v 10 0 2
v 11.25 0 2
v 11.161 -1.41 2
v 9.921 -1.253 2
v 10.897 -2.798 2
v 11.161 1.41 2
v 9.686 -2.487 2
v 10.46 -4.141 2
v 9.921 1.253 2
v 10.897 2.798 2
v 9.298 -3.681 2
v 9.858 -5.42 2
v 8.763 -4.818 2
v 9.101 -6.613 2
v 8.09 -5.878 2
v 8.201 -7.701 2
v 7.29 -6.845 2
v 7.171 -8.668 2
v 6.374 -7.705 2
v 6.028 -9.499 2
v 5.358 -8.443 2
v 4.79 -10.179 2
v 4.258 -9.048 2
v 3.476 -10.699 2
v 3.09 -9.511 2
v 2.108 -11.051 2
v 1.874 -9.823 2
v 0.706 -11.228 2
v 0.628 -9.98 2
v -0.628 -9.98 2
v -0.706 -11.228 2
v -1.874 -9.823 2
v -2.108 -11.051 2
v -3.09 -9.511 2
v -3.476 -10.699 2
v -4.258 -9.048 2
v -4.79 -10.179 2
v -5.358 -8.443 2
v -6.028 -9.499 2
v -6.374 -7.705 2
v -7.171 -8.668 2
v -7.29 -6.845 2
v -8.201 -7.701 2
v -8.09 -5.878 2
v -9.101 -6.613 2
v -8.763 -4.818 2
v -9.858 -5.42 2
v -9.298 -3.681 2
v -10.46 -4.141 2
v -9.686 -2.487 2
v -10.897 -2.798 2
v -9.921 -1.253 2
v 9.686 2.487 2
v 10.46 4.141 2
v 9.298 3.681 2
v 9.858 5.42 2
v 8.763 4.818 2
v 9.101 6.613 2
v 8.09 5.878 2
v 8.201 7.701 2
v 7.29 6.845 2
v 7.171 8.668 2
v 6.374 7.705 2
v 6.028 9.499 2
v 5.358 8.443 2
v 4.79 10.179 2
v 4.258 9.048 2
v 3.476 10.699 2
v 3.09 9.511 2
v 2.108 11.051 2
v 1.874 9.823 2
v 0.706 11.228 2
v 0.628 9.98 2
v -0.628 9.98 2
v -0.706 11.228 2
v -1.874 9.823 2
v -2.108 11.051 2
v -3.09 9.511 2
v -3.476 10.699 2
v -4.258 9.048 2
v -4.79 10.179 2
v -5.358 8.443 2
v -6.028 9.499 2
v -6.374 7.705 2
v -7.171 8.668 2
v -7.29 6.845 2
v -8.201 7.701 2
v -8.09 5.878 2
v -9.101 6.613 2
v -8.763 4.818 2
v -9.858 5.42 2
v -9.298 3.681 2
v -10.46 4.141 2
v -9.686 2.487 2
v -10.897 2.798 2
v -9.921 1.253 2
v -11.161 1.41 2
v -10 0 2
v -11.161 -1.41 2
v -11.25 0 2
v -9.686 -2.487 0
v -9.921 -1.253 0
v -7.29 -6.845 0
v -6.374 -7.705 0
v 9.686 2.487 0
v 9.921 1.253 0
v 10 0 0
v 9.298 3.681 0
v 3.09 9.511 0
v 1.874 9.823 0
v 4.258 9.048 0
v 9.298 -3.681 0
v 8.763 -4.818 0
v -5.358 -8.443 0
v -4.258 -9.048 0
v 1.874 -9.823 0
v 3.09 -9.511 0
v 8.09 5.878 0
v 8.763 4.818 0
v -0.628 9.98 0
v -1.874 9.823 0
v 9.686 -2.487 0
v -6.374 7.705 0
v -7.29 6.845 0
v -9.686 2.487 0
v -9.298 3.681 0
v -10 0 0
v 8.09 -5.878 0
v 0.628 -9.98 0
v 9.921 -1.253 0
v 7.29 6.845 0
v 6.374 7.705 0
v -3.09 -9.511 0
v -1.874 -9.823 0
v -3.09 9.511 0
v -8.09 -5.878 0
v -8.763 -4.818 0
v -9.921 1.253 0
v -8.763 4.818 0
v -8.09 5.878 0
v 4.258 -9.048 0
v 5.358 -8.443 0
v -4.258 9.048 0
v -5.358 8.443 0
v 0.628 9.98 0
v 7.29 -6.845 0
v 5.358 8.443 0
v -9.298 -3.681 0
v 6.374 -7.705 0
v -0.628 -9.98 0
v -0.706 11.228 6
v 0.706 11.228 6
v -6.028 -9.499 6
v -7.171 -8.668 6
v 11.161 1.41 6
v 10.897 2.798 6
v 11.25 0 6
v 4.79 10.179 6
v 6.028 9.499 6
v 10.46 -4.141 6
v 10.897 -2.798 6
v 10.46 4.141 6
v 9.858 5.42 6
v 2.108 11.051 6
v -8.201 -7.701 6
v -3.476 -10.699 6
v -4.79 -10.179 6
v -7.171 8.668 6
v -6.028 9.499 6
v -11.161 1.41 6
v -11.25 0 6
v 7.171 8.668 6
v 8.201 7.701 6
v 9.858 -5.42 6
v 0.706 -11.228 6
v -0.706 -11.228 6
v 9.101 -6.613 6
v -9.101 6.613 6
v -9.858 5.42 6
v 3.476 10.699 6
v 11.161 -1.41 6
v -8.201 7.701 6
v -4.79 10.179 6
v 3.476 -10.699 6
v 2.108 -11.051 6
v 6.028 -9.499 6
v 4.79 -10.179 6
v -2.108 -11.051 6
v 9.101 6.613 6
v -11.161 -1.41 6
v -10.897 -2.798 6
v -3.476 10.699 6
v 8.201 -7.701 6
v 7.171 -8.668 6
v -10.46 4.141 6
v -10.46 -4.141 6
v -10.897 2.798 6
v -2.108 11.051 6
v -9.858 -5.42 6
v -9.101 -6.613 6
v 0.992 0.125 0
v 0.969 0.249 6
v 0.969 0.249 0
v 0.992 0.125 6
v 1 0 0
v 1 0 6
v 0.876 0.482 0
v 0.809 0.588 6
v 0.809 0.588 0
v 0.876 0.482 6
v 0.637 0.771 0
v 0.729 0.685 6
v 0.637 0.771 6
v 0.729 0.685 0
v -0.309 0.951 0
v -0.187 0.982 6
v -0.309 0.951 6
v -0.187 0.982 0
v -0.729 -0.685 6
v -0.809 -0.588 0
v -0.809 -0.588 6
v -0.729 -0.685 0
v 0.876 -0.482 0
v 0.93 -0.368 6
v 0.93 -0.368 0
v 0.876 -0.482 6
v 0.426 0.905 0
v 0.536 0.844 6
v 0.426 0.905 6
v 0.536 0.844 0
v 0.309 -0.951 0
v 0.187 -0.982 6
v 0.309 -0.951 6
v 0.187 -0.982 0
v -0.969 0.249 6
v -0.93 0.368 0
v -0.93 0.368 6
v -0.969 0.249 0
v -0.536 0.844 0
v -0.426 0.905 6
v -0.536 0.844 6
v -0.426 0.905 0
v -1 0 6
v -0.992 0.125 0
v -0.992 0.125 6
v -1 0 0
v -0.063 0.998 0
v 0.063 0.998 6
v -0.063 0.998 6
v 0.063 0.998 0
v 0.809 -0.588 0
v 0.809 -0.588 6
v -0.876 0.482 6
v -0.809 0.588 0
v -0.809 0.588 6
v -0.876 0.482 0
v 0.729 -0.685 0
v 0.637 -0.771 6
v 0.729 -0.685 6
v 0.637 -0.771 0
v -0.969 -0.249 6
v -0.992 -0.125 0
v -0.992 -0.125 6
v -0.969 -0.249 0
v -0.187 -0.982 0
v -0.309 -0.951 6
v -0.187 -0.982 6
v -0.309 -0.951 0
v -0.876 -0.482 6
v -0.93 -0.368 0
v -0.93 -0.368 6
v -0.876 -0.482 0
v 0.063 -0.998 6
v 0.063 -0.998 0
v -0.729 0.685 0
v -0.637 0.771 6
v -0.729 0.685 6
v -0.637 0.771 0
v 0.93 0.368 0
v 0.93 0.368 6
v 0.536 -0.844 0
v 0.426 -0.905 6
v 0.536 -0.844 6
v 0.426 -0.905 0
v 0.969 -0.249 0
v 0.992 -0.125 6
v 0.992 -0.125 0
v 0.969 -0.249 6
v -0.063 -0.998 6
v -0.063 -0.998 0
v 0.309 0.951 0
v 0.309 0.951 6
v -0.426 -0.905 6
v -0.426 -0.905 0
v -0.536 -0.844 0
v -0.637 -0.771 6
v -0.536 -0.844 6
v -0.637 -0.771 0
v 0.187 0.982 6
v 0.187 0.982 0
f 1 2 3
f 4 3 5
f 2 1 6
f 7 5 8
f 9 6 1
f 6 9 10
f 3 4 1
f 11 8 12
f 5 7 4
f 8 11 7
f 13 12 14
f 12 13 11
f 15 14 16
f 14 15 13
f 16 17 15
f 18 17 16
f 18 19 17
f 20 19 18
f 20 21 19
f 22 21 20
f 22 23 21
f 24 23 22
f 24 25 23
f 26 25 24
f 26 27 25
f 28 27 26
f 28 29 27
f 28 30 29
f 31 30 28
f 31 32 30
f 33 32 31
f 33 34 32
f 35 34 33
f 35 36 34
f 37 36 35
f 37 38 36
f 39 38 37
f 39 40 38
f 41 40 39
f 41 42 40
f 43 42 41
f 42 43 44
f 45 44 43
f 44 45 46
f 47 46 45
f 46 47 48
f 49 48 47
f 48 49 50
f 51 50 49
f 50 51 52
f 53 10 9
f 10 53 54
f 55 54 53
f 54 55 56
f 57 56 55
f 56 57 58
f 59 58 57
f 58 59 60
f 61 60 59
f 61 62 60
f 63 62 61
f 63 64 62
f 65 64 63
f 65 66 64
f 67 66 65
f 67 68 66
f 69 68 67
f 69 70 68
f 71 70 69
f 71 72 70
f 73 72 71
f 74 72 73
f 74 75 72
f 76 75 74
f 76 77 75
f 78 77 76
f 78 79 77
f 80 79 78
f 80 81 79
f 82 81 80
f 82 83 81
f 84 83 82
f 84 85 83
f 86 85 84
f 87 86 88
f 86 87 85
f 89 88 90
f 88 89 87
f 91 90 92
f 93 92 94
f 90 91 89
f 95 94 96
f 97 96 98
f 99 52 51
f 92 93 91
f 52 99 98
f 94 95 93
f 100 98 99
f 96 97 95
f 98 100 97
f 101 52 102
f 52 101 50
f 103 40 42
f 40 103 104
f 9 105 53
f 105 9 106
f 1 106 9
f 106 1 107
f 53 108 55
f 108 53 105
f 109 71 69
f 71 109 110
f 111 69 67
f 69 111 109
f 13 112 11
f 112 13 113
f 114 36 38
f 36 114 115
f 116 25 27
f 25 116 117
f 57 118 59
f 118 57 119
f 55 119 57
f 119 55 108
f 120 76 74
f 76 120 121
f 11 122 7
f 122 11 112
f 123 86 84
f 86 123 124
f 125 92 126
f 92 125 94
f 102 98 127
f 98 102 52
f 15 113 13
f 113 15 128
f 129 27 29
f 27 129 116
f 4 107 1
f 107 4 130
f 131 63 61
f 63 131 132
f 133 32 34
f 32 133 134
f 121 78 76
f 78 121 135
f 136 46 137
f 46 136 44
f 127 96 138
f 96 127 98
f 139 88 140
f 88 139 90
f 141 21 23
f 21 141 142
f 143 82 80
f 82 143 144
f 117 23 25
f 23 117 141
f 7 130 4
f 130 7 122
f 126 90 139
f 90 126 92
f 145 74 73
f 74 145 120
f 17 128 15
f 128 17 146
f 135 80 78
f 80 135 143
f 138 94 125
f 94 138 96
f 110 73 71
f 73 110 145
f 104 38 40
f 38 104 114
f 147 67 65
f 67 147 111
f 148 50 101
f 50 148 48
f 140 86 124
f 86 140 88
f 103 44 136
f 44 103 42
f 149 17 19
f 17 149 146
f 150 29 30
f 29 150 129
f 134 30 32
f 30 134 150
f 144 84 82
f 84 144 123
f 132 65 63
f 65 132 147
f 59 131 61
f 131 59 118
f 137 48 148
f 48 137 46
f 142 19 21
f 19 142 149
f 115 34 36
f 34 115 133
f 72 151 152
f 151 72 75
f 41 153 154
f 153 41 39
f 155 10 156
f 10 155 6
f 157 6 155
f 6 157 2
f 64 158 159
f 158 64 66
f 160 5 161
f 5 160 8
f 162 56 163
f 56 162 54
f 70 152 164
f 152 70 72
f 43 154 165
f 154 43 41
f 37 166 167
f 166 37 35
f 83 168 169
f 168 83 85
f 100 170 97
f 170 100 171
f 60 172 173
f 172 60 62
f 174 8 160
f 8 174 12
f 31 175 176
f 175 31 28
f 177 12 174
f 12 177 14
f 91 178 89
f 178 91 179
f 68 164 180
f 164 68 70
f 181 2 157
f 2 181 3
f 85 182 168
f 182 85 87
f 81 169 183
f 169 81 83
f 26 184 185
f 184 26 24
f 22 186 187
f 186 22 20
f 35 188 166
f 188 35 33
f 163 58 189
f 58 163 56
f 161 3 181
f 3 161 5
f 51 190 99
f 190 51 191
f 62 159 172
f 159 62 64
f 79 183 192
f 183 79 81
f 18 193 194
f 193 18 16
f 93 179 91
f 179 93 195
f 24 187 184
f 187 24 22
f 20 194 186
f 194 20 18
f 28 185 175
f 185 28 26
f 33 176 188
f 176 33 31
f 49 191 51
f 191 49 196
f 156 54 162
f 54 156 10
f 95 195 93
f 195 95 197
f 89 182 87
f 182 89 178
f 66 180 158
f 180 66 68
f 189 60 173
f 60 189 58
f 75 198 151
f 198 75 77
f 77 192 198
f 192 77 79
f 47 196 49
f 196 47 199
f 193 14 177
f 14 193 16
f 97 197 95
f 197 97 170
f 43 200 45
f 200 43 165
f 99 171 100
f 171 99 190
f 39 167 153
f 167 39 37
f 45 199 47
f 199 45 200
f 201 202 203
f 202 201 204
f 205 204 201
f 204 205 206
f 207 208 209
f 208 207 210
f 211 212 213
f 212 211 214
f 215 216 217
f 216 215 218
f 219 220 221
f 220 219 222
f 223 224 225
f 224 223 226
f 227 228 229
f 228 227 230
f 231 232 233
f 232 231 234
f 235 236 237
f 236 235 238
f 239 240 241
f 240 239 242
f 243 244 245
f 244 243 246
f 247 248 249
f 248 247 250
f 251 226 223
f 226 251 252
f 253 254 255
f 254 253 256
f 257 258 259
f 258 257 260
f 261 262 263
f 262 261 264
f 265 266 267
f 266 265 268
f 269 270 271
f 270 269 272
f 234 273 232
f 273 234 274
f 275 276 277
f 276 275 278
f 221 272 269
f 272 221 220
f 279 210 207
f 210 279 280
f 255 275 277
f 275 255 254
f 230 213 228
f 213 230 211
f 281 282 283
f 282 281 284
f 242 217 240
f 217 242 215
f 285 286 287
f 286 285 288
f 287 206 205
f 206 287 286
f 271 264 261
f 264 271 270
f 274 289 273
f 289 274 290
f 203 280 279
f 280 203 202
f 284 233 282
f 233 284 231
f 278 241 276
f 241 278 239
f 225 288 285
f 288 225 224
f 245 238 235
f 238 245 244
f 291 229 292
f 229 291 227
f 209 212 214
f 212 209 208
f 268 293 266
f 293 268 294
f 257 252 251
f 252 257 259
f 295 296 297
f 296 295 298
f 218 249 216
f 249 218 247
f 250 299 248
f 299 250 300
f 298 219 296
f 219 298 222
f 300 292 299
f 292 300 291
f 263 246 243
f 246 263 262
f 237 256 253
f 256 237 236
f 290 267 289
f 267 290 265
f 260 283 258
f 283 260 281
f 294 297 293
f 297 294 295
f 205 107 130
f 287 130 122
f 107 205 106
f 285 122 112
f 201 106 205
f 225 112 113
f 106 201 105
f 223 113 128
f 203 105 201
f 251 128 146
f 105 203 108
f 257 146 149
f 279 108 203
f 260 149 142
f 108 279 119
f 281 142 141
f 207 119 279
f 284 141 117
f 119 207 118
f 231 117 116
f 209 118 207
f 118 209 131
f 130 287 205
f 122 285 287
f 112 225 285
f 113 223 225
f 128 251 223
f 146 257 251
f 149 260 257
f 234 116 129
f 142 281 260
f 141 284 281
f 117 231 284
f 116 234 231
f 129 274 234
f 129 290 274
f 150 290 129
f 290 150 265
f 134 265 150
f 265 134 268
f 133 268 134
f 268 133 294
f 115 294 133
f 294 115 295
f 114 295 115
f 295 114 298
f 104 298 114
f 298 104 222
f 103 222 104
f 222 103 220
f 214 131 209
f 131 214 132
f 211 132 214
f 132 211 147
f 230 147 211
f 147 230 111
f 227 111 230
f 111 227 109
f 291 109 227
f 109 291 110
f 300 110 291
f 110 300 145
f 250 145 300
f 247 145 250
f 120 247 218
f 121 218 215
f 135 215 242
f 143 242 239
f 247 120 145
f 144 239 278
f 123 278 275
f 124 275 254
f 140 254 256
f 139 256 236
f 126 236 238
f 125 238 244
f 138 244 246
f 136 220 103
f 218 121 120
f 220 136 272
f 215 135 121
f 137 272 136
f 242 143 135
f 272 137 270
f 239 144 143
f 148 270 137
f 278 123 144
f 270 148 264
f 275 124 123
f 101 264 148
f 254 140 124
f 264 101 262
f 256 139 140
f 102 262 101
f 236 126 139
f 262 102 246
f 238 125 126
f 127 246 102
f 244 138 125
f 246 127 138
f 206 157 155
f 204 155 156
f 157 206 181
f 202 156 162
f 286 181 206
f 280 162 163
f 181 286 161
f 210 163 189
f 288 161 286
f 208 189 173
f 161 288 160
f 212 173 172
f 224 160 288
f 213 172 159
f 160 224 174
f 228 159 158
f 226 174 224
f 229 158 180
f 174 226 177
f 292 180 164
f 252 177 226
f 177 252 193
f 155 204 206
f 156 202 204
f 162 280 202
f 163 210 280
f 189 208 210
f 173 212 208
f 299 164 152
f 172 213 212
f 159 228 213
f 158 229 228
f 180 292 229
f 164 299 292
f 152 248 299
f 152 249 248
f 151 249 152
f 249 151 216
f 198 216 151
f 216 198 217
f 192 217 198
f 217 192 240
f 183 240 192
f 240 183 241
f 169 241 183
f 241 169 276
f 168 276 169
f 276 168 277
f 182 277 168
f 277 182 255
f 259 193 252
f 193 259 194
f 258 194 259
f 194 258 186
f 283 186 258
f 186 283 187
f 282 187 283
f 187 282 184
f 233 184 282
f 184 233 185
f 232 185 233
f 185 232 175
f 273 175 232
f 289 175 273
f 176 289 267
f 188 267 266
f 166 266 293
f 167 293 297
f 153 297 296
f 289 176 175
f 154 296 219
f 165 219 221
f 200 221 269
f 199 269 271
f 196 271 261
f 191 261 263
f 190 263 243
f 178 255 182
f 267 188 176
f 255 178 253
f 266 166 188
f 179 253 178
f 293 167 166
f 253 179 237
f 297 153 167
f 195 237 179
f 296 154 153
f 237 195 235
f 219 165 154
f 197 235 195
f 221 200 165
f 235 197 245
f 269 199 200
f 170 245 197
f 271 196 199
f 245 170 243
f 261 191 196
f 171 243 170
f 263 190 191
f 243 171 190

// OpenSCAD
$fn = 50;


difference() {
	union() {
		*color(alpha = 1.0000000000, c = "gray") {
			translate(v = [0, 7, 0]) {
				linear_extrude(height = 12) {
					text(font = "Arial:style=Bold", halign = "center", size = 4.5000000000, text = "COMMENT bearing_plate_plate", valign = "center");
				}
			}
		}
		*color(alpha = 1.0000000000, c = "gray") {
			translate(v = [0, 14, 0]) {
				linear_extrude(height = 12) {
					text(font = "Arial:style=Bold", halign = "center", size = 4.5000000000, text = "COMMENT description oobb_cylinder_shape_p_type_12_depth_3_width_12_height_12_thickness_motor_servo_micro_01_shaft_p_t_12.0_radius_all_mode", valign = "center");
				}
			}
		}
		translate(v = [0, 0, -6.0000000000]) {
			cylinder(h = 12, r = 12.0000000000);
		}
		*color(alpha = 1.0000000000, c = "gray") {
			translate(v = [0, 7, 0]) {
				linear_extrude(height = 1) {
					text(font = "Arial:style=Bold", halign = "center", size = 4.5000000000, text = "COMMENT bearing_plate_slice", valign = "center");
				}
			}
		}
	}
	union() {
		translate(v = [18.0000000000, 0, -6.0000000000]) {
			rotate(a = [0, 180, 30.0000000000]) {
				difference() {
					union() {
						translate(v = [0, 0, -12.0000000000]) {
							cylinder(h = 12, r = 1.5000000000);
						}
						translate(v = [0, 0, -12.0000000000]) {
							linear_extrude(height = 2.5000000000) {
								polygon(points = [[3.1735000000, 0.0000000000], [1.5867500000, 2.7483316189], [-1.5867500000, 2.7483316189], [-3.1735000000, 0.0000000000], [-1.5867500000, -2.7483316189], [1.5867500000, -2.7483316189]]);
							}
						}
						translate(v = [0, 0, -12.0000000000]) {
							cylinder(h = 12, r = 1.8000000000);
						}
						translate(v = [0, 0, -12.0000000000]) {
							linear_extrude(height = 2.5000000000) {
								polygon(points = [[3.1735000000, 0.0000000000], [1.5867500000, 2.7483316189], [-1.5867500000, 2.7483316189], [-3.1735000000, 0.0000000000], [-1.5867500000, -2.7483316189], [1.5867500000, -2.7483316189]]);
							}
						}
						translate(v = [0, 0, -0.8500000000]) {
							cylinder(r1 = 1.5000000000, r2 = 2.9000000000);
						}
						translate(v = [0, 0, -12.0000000000]) {
							cylinder(h = 12, r = 1.5000000000);
						}
						translate(v = [0, 0, -12.0000000000]) {
							linear_extrude(height = 2.5000000000) {
								polygon(points = [[3.1735000000, 0.0000000000], [1.5867500000, 2.7483316189], [-1.5867500000, 2.7483316189], [-3.1735000000, 0.0000000000], [-1.5867500000, -2.7483316189], [1.5867500000, -2.7483316189]]);
							}
						}
					}
					union();
				}
			}
		}
		translate(v = [-18.0000000000, 0, -6.0000000000]) {
			rotate(a = [0, 180, 30.0000000000]) {
				difference() {
					union() {
						translate(v = [0, 0, -12.0000000000]) {
							cylinder(h = 12, r = 1.5000000000);
						}
						translate(v = [0, 0, -12.0000000000]) {
							linear_extrude(height = 2.5000000000) {
								polygon(points = [[3.1735000000, 0.0000000000], [1.5867500000, 2.7483316189], [-1.5867500000, 2.7483316189], [-3.1735000000, 0.0000000000], [-1.5867500000, -2.7483316189], [1.5867500000, -2.7483316189]]);
							}
						}
						translate(v = [0, 0, -12.0000000000]) {
							cylinder(h = 12, r = 1.8000000000);
						}
						translate(v = [0, 0, -12.0000000000]) {
							linear_extrude(height = 2.5000000000) {
								polygon(points = [[3.1735000000, 0.0000000000], [1.5867500000, 2.7483316189], [-1.5867500000, 2.7483316189], [-3.1735000000, 0.0000000000], [-1.5867500000, -2.7483316189], [1.5867500000, -2.7483316189]]);
							}
						}
						translate(v = [0, 0, -0.8500000000]) {
							cylinder(r1 = 1.5000000000, r2 = 2.9000000000);
						}
						translate(v = [0, 0, -12.0000000000]) {
							cylinder(h = 12, r = 1.5000000000);
						}
						translate(v = [0, 0, -12.0000000000]) {
							linear_extrude(height = 2.5000000000) {
								polygon(points = [[3.1735000000, 0.0000000000], [1.5867500000, 2.7483316189], [-1.5867500000, 2.7483316189], [-3.1735000000, 0.0000000000], [-1.5867500000, -2.7483316189], [1.5867500000, -2.7483316189]]);
							}
						}
					}
					union();
				}
			}
		}
		translate(v = [0, 18.0000000000, 6.0000000000]) {
			rotate(a = [0, 0, 0]) {
				difference() {
					union() {
						translate(v = [0, 0, -12.0000000000]) {
							cylinder(h = 12, r = 1.5000000000);
						}
						translate(v = [0, 0, -12.0000000000]) {
							linear_extrude(height = 2.5000000000) {
								polygon(points = [[3.1735000000, 0.0000000000], [1.5867500000, 2.7483316189], [-1.5867500000, 2.7483316189], [-3.1735000000, 0.0000000000], [-1.5867500000, -2.7483316189], [1.5867500000, -2.7483316189]]);
							}
						}
						translate(v = [0, 0, -12.0000000000]) {
							cylinder(h = 12, r = 1.8000000000);
						}
						translate(v = [0, 0, -12.0000000000]) {
							linear_extrude(height = 2.5000000000) {
								polygon(points = [[3.1735000000, 0.0000000000], [1.5867500000, 2.7483316189], [-1.5867500000, 2.7483316189], [-3.1735000000, 0.0000000000], [-1.5867500000, -2.7483316189], [1.5867500000, -2.7483316189]]);
							}
						}
						translate(v = [0, 0, -0.8500000000]) {
							cylinder(r1 = 1.5000000000, r2 = 2.9000000000);
						}
						translate(v = [0, 0, -12.0000000000]) {
							cylinder(h = 12, r = 1.5000000000);
						}
						translate(v = [0, 0, -12.0000000000]) {
							linear_extrude(height = 2.5000000000) {
								polygon(points = [[3.1735000000, 0.0000000000], [1.5867500000, 2.7483316189], [-1.5867500000, 2.7483316189], [-3.1735000000, 0.0000000000], [-1.5867500000, -2.7483316189], [1.5867500000, -2.7483316189]]);
							}
						}
					}
					union();
				}
			}
		}
		translate(v = [0, -18.0000000000, 6.0000000000]) {
			rotate(a = [0, 0, 0]) {
				difference() {
					union() {
						translate(v = [0, 0, -12.0000000000]) {
							cylinder(h = 12, r = 1.5000000000);
						}
						translate(v = [0, 0, -12.0000000000]) {
							linear_extrude(height = 2.5000000000) {
								polygon(points = [[3.1735000000, 0.0000000000], [1.5867500000, 2.7483316189], [-1.5867500000, 2.7483316189], [-3.1735000000, 0.0000000000], [-1.5867500000, -2.7483316189], [1.5867500000, -2.7483316189]]);
							}
						}
						translate(v = [0, 0, -12.0000000000]) {
							cylinder(h = 12, r = 1.8000000000);
						}
						translate(v = [0, 0, -12.0000000000]) {
							linear_extrude(height = 2.5000000000) {
								polygon(points = [[3.1735000000, 0.0000000000], [1.5867500000, 2.7483316189], [-1.5867500000, 2.7483316189], [-3.1735000000, 0.0000000000], [-1.5867500000, -2.7483316189], [1.5867500000, -2.7483316189]]);
							}
						}
						translate(v = [0, 0, -0.8500000000]) {
							cylinder(r1 = 1.5000000000, r2 = 2.9000000000);
						}
						translate(v = [0, 0, -12.0000000000]) {
							cylinder(h = 12, r = 1.5000000000);
						}
						translate(v = [0, 0, -12.0000000000]) {
							linear_extrude(height = 2.5000000000) {
								polygon(points = [[3.1735000000, 0.0000000000], [1.5867500000, 2.7483316189], [-1.5867500000, 2.7483316189], [-3.1735000000, 0.0000000000], [-1.5867500000, -2.7483316189], [1.5867500000, -2.7483316189]]);
							}
						}
					}
					union();
				}
			}
		}
		*color(alpha = 1.0000000000, c = "gray") {
			translate(v = [0, 14, 0]) {
				linear_extrude(height = 3) {
					text(font = "Arial:style=Bold", halign = "center", size = 4.5000000000, text = "COMMENT description oobb_bearing_shape_n_type_12_depth_3_width_3_height_12_thickness_motor_servo_micro_01_shaft_6704_bearing", valign = "center");
				}
			}
		}
		translate(v = [0, 0, -2.0000000000]) {
			union() {
				difference() {
					cylinder(h = 4, r = 13.5000000000);
					cylinder(h = 4, r = 10.0000000000);
				}
				difference() {
					translate(v = [0, 0, -50]) {
						cylinder(h = 100, r = 12.2500000000);
					}
					translate(v = [0, 0, -50]) {
						cylinder(h = 100, r = 11.2500000000);
					}
				}
			}
		}
		*color(alpha = 1.0000000000, c = "gray") {
			translate(v = [0, 14, 0]) {
				linear_extrude(height = 3) {
					text(font = "Arial:style=Bold", halign = "center", size = 4.5000000000, text = "COMMENT description oobb_holes_shape_n_type_m6_radius_name_3_width_3_height_12_thickness_motor_servo_micro_01_shaft_perimeter_miss_middle_holes", valign = "center");
				}
			}
		}
		translate(v = [-15.0000000000, -15.0000000000, -50.0000000000]) {
			cylinder(h = 100, r = 3.0000000000);
		}
		translate(v = [-15.0000000000, 15.0000000000, -50.0000000000]) {
			cylinder(h = 100, r = 3.0000000000);
		}
		translate(v = [15.0000000000, -15.0000000000, -50.0000000000]) {
			cylinder(h = 100, r = 3.0000000000);
		}
		translate(v = [15.0000000000, 15.0000000000, -50.0000000000]) {
			cylinder(h = 100, r = 3.0000000000);
		}
		*color(alpha = 1.0000000000, c = "gray") {
			translate(v = [0, 14, 0]) {
				linear_extrude(height = 3) {
					text(font = "Arial:style=Bold", halign = "center", size = 4.5000000000, text = "COMMENT description oobb_motor_servo_micro_01_shape_n_type_3_width_3_height_12_thickness_motor_servo_micro_01_shaft_shaft_part", valign = "center");
				}
			}
		}
		translate(v = [0, 0, -6.0000000000]) {
			cylinder(h = 3, r1 = 2.5000000000, r2 = 2.4000000000);
		}
		translate(v = [0, 0, -50.0000000000]) {
			cylinder(h = 100, r = 1.0000000000);
		}
		*color(alpha = 1.0000000000, c = "gray") {
			translate(v = [18.0000000000, 14, -6.0000000000]) {
				rotate(a = [0, 180, 30.0000000000]) {
					linear_extrude(height = 3) {
						text(font = "Arial:style=Bold", halign = "center", size = 4.5000000000, text = "COMMENT description oobb_screw_countersunk_shape_n_type_m3_radius_name_12_depth_18.0_0_-6.0_pos_3_width_3_height_12_thickness_motor_servo_micro_01_shaft_0_180_30.0_rot_true_nut_true_overhang", valign = "center");
					}
				}
			}
		}
		*color(alpha = 1.0000000000, c = "gray") {
			translate(v = [-18.0000000000, 14, -6.0000000000]) {
				rotate(a = [0, 180, 30.0000000000]) {
					linear_extrude(height = 3) {
						text(font = "Arial:style=Bold", halign = "center", size = 4.5000000000, text = "COMMENT description oobb_screw_countersunk_shape_n_type_m3_radius_name_12_depth_-18.0_0_-6.0_pos_3_width_3_height_12_thickness_motor_servo_micro_01_shaft_0_180_30.0_rot_true_nut_true_overhang", valign = "center");
					}
				}
			}
		}
		*color(alpha = 1.0000000000, c = "gray") {
			translate(v = [0, 32.0000000000, 6.0000000000]) {
				linear_extrude(height = 3) {
					text(font = "Arial:style=Bold", halign = "center", size = 4.5000000000, text = "COMMENT description oobb_screw_countersunk_shape_n_type_m3_radius_name_12_depth_0_18.0_6.0_pos_3_width_3_height_12_thickness_motor_servo_micro_01_shaft_0_0_0_rot_true_nut_true_overhang", valign = "center");
				}
			}
		}
		*color(alpha = 1.0000000000, c = "gray") {
			translate(v = [0, -4.0000000000, 6.0000000000]) {
				linear_extrude(height = 3) {
					text(font = "Arial:style=Bold", halign = "center", size = 4.5000000000, text = "COMMENT description oobb_screw_countersunk_shape_n_type_m3_radius_name_12_depth_0_-18.0_6.0_pos_3_width_3_height_12_thickness_motor_servo_micro_01_shaft_0_0_0_rot_true_nut_true_overhang", valign = "center");
				}
			}
		}
		*color(alpha = 1.0000000000, c = "gray") {
			translate(v = [0, 14, 0]) {
				linear_extrude(height = 1) {
					text(font = "Arial:style=Bold", halign = "center", size = 4.5000000000, text = "COMMENT description oobb_slice_shape_n_type_3dpr_mode_top_zz", valign = "center");
				}
			}
		}
		translate(v = [-250, -250, -500]) {
			cube(size = [500, 500, 500]);
		}
	}
}
